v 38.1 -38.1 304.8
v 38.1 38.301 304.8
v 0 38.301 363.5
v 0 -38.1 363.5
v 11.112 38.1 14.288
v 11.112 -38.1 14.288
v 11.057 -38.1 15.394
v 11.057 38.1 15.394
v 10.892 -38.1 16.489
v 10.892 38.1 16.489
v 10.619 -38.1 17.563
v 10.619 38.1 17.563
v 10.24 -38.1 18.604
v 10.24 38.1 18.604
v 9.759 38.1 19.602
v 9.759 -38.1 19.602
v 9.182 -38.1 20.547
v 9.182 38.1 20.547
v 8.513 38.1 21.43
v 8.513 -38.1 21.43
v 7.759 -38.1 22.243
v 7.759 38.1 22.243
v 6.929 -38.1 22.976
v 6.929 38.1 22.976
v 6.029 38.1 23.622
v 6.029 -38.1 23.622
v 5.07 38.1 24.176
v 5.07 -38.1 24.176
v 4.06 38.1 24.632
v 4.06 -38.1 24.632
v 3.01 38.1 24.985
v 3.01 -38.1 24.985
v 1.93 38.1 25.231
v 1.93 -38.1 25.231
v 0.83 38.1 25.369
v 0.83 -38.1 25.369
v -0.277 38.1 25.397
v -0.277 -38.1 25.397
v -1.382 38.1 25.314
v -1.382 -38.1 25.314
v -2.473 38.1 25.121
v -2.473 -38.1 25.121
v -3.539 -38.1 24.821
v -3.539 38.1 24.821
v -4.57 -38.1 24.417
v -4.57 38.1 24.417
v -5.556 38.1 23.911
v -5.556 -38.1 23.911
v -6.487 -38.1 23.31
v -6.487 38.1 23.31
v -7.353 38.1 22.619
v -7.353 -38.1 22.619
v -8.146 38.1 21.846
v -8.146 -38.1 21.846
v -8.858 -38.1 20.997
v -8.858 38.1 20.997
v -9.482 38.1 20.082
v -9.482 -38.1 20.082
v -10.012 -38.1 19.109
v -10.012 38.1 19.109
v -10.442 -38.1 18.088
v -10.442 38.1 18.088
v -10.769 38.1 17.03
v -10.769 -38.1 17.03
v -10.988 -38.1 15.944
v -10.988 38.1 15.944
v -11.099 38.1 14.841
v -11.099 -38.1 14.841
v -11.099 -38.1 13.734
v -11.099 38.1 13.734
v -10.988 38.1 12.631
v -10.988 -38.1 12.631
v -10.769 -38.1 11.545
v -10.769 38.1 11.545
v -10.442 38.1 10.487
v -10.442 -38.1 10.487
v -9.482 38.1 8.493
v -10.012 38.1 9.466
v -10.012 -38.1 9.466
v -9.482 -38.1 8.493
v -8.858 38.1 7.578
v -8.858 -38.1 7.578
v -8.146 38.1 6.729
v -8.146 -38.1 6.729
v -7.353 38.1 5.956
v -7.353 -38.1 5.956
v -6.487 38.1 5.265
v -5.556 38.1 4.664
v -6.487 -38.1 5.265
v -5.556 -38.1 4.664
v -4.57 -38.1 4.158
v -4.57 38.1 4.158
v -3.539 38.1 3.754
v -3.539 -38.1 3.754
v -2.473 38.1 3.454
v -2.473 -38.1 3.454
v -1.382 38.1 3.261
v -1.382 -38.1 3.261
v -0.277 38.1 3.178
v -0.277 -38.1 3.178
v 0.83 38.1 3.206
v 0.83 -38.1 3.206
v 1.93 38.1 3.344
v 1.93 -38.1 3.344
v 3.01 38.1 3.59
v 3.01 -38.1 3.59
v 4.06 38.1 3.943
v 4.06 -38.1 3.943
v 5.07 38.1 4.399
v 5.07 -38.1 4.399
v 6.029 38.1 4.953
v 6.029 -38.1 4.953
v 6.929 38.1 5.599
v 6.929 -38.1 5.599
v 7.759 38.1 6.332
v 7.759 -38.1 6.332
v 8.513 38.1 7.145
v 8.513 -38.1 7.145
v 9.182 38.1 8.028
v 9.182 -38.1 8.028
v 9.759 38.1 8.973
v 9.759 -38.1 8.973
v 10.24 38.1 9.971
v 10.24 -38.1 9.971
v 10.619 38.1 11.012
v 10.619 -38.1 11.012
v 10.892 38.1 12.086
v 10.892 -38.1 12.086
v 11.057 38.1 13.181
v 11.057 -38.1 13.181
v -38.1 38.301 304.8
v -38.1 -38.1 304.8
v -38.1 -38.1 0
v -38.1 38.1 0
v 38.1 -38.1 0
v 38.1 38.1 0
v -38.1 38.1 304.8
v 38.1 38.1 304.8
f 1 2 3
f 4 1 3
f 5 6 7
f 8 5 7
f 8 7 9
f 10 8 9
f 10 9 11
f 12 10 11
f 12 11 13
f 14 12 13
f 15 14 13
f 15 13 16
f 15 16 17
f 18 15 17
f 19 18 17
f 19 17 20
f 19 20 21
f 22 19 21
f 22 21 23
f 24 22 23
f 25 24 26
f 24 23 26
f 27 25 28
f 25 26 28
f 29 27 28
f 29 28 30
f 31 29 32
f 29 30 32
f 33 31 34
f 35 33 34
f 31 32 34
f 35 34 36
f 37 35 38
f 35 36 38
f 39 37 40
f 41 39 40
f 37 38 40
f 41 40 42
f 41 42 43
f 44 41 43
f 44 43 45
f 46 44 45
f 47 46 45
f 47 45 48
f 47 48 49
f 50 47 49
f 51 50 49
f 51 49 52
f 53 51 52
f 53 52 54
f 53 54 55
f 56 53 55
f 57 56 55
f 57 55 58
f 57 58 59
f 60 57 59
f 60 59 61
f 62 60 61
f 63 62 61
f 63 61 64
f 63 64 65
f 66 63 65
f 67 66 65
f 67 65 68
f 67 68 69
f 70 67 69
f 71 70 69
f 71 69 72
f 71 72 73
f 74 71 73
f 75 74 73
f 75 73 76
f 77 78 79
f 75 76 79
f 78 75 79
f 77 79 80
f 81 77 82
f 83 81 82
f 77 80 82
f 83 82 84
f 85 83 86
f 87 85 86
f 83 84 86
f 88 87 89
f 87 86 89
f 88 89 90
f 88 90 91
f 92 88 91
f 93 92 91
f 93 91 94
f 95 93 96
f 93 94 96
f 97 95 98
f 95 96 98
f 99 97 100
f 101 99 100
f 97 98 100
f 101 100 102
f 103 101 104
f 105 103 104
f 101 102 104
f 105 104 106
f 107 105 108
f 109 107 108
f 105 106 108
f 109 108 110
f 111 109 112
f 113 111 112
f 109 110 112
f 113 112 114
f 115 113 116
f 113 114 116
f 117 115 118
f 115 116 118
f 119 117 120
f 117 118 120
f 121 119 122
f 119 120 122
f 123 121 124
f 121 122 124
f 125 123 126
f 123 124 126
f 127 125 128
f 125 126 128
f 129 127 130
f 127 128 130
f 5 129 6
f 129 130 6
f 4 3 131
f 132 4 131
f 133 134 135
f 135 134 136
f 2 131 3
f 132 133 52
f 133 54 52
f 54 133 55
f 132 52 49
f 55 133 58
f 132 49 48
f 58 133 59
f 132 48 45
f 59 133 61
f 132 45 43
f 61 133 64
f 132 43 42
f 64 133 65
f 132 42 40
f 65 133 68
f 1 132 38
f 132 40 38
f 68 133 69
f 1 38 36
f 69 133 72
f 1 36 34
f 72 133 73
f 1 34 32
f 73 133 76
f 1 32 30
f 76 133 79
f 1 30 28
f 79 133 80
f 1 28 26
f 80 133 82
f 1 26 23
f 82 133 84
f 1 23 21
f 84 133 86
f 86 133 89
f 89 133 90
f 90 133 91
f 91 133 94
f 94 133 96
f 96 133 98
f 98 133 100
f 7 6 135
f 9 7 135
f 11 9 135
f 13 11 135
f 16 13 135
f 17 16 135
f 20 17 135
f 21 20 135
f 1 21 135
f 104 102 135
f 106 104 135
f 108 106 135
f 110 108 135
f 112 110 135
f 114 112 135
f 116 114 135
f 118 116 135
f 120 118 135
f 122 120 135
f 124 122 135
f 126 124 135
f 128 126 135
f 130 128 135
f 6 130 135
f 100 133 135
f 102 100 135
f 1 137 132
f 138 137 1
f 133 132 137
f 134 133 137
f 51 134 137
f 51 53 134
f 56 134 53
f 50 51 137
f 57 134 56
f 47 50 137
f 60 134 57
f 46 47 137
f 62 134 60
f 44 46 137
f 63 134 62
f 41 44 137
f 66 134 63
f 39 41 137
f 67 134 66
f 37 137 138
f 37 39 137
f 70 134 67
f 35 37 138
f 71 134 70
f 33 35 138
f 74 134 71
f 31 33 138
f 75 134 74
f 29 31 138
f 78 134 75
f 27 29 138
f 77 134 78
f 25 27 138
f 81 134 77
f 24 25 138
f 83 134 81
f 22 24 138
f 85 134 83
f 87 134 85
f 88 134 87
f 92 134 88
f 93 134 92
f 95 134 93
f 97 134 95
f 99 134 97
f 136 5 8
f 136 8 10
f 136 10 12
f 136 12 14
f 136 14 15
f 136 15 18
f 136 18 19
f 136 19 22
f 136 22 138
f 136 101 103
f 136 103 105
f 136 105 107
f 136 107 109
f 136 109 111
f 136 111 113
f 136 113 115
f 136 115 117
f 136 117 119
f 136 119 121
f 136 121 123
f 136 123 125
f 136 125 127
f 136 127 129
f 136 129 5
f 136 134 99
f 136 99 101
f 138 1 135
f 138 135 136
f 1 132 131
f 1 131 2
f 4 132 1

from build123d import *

# Parameters (mm, degrees)
F0_W     = 76.2
F0_H     = 76.2
F1_DEPTH = 304.8
F3_DEPTH = 76.40143
F4_R     = 11.1125
F5_DEPTH = 286.60755


with BuildPart() as f1:
    # F0 (on Top) → F1 (new body)
    with BuildSketch(Plane.XY):
        Rectangle(F0_W, F0_H)
    extrude(amount=F1_DEPTH)

    # F4 (on face) → F5 (cut)
    with BuildSketch(Plane.XZ.offset(38.1)):
        with Locations((0, 14.2875)):
            Circle(F4_R)
    extrude(amount=-F5_DEPTH, mode=Mode.SUBTRACT)


with BuildPart() as f3:
    # F2 (on face) → F3 (new body)
    with BuildSketch(Plane.XZ.offset(38.1)):
        Polygon((0, 363.499522), (-38.1, 304.8), (38.1, 304.8), align=None)
    extrude(amount=-F3_DEPTH)


solid = Compound([f1.part, f3.part])
